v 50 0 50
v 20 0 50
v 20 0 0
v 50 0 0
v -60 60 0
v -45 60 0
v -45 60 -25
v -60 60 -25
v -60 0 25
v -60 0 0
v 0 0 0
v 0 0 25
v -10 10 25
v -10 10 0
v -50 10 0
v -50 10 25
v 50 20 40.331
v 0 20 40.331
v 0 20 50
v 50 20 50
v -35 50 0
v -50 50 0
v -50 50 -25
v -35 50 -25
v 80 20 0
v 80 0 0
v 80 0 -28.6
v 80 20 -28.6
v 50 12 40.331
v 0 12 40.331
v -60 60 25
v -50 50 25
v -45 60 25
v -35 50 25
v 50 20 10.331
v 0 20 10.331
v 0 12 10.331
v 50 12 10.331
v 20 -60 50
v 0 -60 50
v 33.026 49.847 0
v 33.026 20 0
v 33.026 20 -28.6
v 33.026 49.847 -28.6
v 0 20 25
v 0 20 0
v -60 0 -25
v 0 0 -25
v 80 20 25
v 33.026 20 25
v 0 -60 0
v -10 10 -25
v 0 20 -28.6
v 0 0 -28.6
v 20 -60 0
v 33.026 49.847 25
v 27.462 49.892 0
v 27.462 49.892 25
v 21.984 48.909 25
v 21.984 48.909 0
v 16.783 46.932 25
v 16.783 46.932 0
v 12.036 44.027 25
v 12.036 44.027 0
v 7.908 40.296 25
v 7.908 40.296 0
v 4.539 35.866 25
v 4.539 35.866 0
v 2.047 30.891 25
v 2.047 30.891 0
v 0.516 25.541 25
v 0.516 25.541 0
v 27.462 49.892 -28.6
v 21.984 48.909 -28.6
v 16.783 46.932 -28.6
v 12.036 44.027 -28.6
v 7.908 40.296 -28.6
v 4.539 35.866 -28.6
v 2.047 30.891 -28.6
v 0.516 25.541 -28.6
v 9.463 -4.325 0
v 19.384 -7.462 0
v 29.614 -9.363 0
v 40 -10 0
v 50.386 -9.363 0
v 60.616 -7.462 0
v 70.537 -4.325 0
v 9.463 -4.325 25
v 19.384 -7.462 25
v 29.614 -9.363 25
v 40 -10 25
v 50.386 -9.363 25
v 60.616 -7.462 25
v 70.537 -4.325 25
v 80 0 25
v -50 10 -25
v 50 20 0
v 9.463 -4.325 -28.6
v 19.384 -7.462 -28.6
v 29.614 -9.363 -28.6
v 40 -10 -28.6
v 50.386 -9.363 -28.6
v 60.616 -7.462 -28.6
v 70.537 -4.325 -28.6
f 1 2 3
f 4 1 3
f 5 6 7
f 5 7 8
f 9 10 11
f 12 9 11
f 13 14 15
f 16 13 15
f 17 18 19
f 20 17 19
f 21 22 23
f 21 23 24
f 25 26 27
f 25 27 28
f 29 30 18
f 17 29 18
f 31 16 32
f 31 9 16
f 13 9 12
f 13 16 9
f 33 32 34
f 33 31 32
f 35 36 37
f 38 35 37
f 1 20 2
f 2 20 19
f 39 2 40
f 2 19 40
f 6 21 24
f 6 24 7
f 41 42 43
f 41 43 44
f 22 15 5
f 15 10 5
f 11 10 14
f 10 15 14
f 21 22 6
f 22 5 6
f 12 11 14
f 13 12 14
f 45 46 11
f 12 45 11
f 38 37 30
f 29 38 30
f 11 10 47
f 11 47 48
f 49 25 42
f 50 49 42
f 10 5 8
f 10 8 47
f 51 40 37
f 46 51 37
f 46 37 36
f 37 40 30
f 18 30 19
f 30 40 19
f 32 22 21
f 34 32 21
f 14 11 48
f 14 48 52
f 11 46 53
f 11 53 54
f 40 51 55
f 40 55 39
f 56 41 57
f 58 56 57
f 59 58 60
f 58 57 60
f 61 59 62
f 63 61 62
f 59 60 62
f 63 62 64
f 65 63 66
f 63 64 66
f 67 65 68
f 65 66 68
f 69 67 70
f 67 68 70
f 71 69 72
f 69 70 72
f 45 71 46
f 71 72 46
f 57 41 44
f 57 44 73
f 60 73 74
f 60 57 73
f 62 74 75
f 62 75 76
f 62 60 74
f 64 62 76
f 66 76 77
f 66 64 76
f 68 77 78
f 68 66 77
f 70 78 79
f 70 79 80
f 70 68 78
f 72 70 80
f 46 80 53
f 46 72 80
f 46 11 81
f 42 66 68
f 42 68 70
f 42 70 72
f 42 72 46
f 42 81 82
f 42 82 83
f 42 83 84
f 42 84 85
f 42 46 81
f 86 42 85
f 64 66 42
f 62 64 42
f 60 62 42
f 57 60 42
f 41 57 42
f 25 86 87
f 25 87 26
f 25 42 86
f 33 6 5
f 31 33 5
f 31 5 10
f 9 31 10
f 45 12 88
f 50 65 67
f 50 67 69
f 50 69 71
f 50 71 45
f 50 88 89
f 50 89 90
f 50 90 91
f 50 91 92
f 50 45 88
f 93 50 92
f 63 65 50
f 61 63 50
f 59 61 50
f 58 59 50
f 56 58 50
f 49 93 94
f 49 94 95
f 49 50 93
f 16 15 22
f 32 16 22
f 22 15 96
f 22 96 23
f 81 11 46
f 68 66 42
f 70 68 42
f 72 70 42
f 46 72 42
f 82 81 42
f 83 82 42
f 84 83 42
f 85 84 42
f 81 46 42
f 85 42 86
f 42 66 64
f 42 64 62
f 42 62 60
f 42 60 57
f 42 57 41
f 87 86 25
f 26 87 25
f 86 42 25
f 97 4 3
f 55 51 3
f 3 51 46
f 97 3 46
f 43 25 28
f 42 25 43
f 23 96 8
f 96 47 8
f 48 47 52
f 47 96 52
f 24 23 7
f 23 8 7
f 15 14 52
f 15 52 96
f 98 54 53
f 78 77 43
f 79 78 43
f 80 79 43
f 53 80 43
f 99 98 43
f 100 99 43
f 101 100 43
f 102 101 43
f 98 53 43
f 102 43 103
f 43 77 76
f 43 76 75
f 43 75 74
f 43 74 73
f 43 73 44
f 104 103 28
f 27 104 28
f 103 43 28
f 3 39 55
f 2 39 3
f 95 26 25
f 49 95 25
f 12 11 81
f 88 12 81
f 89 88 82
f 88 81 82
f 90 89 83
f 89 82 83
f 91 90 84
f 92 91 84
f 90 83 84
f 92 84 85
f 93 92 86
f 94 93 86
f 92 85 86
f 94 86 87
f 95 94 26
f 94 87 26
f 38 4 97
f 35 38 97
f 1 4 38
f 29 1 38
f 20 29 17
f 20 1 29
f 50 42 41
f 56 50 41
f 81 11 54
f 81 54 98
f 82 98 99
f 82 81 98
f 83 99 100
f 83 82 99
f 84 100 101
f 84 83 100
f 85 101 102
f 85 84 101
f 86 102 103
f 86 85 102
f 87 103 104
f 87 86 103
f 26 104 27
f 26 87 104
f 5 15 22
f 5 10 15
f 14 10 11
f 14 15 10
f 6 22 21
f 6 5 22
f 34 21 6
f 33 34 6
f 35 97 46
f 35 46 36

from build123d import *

# Parameters (mm, degrees)
F2_DEPTH = 28.6
F3_DEPTH = 25
F4_DEPTH = 25
F5_W     = 60
F5_H     = 50
F6_DEPTH = 20
F7_DEPTH = 50


with BuildPart() as f2:
    # F1 (on Top) → F2 (new body)
    with BuildSketch(Plane.XY):
        with BuildLine():
            Line((33.0262016572, 20), (33.0262016572, 49.8469781306))
            ThreePointArc((33.0262016572, 49.8469781306), (9.8851553538, 42.2574262856), (0, 20))
            Line((0, 20), (0, 0))
            ThreePointArc((0, 0), (40, -10), (80, 0))
            Line((80, 0), (80, 20))
            Line((80, 20), (33.0262016572, 20))
        make_face()
    extrude(amount=-F2_DEPTH)


with BuildPart() as f3:
    # F0 (on Top) → F3 (new body)
    with BuildSketch(Plane.XY):
        Polygon((-35, 50), (-45, 60), (-60, 60), (-60, 0), (0, 0), (-10, 10), (-50, 10), (-50, 50), align=None)
    extrude(amount=-F3_DEPTH)


with BuildPart() as f4:
    # F4 (new): a face of the model
    f4_faces = [f3.part.faces().sort_by_distance(p)[0] for p in [
        (-40.6, 54.4, 0),
    ]]
    extrude(f4_faces, amount=F4_DEPTH)


with BuildPart() as f4b:
    # F4#2 (new): a face of the model
    f4_2_faces = [f2.part.faces().sort_by_distance(p)[0] for p in [
        (34.2678216029, 13.6636139623, 0),
    ]]
    extrude(f4_2_faces, amount=F4_DEPTH)


with BuildPart() as f6:
    # F5 (on Right) → F6 (new body)
    with BuildSketch(Plane.YZ):
        with Locations((-30, 25)):
            Rectangle(F5_W, F5_H)
    extrude(amount=F6_DEPTH)

    # F5 (on Right) → F7 (join)
    with BuildSketch(Plane.YZ):
        Polygon((20, 50), (0, 50), (0, 0), (20, 0), (20, 10.3311939165), (12, 10.3311939165), (12, 40.3311939165), (20, 40.3311939165), align=None)
    extrude(amount=F7_DEPTH)


solid = Compound([f2.part, f3.part, f4.part, f4b.part, f6.part])
